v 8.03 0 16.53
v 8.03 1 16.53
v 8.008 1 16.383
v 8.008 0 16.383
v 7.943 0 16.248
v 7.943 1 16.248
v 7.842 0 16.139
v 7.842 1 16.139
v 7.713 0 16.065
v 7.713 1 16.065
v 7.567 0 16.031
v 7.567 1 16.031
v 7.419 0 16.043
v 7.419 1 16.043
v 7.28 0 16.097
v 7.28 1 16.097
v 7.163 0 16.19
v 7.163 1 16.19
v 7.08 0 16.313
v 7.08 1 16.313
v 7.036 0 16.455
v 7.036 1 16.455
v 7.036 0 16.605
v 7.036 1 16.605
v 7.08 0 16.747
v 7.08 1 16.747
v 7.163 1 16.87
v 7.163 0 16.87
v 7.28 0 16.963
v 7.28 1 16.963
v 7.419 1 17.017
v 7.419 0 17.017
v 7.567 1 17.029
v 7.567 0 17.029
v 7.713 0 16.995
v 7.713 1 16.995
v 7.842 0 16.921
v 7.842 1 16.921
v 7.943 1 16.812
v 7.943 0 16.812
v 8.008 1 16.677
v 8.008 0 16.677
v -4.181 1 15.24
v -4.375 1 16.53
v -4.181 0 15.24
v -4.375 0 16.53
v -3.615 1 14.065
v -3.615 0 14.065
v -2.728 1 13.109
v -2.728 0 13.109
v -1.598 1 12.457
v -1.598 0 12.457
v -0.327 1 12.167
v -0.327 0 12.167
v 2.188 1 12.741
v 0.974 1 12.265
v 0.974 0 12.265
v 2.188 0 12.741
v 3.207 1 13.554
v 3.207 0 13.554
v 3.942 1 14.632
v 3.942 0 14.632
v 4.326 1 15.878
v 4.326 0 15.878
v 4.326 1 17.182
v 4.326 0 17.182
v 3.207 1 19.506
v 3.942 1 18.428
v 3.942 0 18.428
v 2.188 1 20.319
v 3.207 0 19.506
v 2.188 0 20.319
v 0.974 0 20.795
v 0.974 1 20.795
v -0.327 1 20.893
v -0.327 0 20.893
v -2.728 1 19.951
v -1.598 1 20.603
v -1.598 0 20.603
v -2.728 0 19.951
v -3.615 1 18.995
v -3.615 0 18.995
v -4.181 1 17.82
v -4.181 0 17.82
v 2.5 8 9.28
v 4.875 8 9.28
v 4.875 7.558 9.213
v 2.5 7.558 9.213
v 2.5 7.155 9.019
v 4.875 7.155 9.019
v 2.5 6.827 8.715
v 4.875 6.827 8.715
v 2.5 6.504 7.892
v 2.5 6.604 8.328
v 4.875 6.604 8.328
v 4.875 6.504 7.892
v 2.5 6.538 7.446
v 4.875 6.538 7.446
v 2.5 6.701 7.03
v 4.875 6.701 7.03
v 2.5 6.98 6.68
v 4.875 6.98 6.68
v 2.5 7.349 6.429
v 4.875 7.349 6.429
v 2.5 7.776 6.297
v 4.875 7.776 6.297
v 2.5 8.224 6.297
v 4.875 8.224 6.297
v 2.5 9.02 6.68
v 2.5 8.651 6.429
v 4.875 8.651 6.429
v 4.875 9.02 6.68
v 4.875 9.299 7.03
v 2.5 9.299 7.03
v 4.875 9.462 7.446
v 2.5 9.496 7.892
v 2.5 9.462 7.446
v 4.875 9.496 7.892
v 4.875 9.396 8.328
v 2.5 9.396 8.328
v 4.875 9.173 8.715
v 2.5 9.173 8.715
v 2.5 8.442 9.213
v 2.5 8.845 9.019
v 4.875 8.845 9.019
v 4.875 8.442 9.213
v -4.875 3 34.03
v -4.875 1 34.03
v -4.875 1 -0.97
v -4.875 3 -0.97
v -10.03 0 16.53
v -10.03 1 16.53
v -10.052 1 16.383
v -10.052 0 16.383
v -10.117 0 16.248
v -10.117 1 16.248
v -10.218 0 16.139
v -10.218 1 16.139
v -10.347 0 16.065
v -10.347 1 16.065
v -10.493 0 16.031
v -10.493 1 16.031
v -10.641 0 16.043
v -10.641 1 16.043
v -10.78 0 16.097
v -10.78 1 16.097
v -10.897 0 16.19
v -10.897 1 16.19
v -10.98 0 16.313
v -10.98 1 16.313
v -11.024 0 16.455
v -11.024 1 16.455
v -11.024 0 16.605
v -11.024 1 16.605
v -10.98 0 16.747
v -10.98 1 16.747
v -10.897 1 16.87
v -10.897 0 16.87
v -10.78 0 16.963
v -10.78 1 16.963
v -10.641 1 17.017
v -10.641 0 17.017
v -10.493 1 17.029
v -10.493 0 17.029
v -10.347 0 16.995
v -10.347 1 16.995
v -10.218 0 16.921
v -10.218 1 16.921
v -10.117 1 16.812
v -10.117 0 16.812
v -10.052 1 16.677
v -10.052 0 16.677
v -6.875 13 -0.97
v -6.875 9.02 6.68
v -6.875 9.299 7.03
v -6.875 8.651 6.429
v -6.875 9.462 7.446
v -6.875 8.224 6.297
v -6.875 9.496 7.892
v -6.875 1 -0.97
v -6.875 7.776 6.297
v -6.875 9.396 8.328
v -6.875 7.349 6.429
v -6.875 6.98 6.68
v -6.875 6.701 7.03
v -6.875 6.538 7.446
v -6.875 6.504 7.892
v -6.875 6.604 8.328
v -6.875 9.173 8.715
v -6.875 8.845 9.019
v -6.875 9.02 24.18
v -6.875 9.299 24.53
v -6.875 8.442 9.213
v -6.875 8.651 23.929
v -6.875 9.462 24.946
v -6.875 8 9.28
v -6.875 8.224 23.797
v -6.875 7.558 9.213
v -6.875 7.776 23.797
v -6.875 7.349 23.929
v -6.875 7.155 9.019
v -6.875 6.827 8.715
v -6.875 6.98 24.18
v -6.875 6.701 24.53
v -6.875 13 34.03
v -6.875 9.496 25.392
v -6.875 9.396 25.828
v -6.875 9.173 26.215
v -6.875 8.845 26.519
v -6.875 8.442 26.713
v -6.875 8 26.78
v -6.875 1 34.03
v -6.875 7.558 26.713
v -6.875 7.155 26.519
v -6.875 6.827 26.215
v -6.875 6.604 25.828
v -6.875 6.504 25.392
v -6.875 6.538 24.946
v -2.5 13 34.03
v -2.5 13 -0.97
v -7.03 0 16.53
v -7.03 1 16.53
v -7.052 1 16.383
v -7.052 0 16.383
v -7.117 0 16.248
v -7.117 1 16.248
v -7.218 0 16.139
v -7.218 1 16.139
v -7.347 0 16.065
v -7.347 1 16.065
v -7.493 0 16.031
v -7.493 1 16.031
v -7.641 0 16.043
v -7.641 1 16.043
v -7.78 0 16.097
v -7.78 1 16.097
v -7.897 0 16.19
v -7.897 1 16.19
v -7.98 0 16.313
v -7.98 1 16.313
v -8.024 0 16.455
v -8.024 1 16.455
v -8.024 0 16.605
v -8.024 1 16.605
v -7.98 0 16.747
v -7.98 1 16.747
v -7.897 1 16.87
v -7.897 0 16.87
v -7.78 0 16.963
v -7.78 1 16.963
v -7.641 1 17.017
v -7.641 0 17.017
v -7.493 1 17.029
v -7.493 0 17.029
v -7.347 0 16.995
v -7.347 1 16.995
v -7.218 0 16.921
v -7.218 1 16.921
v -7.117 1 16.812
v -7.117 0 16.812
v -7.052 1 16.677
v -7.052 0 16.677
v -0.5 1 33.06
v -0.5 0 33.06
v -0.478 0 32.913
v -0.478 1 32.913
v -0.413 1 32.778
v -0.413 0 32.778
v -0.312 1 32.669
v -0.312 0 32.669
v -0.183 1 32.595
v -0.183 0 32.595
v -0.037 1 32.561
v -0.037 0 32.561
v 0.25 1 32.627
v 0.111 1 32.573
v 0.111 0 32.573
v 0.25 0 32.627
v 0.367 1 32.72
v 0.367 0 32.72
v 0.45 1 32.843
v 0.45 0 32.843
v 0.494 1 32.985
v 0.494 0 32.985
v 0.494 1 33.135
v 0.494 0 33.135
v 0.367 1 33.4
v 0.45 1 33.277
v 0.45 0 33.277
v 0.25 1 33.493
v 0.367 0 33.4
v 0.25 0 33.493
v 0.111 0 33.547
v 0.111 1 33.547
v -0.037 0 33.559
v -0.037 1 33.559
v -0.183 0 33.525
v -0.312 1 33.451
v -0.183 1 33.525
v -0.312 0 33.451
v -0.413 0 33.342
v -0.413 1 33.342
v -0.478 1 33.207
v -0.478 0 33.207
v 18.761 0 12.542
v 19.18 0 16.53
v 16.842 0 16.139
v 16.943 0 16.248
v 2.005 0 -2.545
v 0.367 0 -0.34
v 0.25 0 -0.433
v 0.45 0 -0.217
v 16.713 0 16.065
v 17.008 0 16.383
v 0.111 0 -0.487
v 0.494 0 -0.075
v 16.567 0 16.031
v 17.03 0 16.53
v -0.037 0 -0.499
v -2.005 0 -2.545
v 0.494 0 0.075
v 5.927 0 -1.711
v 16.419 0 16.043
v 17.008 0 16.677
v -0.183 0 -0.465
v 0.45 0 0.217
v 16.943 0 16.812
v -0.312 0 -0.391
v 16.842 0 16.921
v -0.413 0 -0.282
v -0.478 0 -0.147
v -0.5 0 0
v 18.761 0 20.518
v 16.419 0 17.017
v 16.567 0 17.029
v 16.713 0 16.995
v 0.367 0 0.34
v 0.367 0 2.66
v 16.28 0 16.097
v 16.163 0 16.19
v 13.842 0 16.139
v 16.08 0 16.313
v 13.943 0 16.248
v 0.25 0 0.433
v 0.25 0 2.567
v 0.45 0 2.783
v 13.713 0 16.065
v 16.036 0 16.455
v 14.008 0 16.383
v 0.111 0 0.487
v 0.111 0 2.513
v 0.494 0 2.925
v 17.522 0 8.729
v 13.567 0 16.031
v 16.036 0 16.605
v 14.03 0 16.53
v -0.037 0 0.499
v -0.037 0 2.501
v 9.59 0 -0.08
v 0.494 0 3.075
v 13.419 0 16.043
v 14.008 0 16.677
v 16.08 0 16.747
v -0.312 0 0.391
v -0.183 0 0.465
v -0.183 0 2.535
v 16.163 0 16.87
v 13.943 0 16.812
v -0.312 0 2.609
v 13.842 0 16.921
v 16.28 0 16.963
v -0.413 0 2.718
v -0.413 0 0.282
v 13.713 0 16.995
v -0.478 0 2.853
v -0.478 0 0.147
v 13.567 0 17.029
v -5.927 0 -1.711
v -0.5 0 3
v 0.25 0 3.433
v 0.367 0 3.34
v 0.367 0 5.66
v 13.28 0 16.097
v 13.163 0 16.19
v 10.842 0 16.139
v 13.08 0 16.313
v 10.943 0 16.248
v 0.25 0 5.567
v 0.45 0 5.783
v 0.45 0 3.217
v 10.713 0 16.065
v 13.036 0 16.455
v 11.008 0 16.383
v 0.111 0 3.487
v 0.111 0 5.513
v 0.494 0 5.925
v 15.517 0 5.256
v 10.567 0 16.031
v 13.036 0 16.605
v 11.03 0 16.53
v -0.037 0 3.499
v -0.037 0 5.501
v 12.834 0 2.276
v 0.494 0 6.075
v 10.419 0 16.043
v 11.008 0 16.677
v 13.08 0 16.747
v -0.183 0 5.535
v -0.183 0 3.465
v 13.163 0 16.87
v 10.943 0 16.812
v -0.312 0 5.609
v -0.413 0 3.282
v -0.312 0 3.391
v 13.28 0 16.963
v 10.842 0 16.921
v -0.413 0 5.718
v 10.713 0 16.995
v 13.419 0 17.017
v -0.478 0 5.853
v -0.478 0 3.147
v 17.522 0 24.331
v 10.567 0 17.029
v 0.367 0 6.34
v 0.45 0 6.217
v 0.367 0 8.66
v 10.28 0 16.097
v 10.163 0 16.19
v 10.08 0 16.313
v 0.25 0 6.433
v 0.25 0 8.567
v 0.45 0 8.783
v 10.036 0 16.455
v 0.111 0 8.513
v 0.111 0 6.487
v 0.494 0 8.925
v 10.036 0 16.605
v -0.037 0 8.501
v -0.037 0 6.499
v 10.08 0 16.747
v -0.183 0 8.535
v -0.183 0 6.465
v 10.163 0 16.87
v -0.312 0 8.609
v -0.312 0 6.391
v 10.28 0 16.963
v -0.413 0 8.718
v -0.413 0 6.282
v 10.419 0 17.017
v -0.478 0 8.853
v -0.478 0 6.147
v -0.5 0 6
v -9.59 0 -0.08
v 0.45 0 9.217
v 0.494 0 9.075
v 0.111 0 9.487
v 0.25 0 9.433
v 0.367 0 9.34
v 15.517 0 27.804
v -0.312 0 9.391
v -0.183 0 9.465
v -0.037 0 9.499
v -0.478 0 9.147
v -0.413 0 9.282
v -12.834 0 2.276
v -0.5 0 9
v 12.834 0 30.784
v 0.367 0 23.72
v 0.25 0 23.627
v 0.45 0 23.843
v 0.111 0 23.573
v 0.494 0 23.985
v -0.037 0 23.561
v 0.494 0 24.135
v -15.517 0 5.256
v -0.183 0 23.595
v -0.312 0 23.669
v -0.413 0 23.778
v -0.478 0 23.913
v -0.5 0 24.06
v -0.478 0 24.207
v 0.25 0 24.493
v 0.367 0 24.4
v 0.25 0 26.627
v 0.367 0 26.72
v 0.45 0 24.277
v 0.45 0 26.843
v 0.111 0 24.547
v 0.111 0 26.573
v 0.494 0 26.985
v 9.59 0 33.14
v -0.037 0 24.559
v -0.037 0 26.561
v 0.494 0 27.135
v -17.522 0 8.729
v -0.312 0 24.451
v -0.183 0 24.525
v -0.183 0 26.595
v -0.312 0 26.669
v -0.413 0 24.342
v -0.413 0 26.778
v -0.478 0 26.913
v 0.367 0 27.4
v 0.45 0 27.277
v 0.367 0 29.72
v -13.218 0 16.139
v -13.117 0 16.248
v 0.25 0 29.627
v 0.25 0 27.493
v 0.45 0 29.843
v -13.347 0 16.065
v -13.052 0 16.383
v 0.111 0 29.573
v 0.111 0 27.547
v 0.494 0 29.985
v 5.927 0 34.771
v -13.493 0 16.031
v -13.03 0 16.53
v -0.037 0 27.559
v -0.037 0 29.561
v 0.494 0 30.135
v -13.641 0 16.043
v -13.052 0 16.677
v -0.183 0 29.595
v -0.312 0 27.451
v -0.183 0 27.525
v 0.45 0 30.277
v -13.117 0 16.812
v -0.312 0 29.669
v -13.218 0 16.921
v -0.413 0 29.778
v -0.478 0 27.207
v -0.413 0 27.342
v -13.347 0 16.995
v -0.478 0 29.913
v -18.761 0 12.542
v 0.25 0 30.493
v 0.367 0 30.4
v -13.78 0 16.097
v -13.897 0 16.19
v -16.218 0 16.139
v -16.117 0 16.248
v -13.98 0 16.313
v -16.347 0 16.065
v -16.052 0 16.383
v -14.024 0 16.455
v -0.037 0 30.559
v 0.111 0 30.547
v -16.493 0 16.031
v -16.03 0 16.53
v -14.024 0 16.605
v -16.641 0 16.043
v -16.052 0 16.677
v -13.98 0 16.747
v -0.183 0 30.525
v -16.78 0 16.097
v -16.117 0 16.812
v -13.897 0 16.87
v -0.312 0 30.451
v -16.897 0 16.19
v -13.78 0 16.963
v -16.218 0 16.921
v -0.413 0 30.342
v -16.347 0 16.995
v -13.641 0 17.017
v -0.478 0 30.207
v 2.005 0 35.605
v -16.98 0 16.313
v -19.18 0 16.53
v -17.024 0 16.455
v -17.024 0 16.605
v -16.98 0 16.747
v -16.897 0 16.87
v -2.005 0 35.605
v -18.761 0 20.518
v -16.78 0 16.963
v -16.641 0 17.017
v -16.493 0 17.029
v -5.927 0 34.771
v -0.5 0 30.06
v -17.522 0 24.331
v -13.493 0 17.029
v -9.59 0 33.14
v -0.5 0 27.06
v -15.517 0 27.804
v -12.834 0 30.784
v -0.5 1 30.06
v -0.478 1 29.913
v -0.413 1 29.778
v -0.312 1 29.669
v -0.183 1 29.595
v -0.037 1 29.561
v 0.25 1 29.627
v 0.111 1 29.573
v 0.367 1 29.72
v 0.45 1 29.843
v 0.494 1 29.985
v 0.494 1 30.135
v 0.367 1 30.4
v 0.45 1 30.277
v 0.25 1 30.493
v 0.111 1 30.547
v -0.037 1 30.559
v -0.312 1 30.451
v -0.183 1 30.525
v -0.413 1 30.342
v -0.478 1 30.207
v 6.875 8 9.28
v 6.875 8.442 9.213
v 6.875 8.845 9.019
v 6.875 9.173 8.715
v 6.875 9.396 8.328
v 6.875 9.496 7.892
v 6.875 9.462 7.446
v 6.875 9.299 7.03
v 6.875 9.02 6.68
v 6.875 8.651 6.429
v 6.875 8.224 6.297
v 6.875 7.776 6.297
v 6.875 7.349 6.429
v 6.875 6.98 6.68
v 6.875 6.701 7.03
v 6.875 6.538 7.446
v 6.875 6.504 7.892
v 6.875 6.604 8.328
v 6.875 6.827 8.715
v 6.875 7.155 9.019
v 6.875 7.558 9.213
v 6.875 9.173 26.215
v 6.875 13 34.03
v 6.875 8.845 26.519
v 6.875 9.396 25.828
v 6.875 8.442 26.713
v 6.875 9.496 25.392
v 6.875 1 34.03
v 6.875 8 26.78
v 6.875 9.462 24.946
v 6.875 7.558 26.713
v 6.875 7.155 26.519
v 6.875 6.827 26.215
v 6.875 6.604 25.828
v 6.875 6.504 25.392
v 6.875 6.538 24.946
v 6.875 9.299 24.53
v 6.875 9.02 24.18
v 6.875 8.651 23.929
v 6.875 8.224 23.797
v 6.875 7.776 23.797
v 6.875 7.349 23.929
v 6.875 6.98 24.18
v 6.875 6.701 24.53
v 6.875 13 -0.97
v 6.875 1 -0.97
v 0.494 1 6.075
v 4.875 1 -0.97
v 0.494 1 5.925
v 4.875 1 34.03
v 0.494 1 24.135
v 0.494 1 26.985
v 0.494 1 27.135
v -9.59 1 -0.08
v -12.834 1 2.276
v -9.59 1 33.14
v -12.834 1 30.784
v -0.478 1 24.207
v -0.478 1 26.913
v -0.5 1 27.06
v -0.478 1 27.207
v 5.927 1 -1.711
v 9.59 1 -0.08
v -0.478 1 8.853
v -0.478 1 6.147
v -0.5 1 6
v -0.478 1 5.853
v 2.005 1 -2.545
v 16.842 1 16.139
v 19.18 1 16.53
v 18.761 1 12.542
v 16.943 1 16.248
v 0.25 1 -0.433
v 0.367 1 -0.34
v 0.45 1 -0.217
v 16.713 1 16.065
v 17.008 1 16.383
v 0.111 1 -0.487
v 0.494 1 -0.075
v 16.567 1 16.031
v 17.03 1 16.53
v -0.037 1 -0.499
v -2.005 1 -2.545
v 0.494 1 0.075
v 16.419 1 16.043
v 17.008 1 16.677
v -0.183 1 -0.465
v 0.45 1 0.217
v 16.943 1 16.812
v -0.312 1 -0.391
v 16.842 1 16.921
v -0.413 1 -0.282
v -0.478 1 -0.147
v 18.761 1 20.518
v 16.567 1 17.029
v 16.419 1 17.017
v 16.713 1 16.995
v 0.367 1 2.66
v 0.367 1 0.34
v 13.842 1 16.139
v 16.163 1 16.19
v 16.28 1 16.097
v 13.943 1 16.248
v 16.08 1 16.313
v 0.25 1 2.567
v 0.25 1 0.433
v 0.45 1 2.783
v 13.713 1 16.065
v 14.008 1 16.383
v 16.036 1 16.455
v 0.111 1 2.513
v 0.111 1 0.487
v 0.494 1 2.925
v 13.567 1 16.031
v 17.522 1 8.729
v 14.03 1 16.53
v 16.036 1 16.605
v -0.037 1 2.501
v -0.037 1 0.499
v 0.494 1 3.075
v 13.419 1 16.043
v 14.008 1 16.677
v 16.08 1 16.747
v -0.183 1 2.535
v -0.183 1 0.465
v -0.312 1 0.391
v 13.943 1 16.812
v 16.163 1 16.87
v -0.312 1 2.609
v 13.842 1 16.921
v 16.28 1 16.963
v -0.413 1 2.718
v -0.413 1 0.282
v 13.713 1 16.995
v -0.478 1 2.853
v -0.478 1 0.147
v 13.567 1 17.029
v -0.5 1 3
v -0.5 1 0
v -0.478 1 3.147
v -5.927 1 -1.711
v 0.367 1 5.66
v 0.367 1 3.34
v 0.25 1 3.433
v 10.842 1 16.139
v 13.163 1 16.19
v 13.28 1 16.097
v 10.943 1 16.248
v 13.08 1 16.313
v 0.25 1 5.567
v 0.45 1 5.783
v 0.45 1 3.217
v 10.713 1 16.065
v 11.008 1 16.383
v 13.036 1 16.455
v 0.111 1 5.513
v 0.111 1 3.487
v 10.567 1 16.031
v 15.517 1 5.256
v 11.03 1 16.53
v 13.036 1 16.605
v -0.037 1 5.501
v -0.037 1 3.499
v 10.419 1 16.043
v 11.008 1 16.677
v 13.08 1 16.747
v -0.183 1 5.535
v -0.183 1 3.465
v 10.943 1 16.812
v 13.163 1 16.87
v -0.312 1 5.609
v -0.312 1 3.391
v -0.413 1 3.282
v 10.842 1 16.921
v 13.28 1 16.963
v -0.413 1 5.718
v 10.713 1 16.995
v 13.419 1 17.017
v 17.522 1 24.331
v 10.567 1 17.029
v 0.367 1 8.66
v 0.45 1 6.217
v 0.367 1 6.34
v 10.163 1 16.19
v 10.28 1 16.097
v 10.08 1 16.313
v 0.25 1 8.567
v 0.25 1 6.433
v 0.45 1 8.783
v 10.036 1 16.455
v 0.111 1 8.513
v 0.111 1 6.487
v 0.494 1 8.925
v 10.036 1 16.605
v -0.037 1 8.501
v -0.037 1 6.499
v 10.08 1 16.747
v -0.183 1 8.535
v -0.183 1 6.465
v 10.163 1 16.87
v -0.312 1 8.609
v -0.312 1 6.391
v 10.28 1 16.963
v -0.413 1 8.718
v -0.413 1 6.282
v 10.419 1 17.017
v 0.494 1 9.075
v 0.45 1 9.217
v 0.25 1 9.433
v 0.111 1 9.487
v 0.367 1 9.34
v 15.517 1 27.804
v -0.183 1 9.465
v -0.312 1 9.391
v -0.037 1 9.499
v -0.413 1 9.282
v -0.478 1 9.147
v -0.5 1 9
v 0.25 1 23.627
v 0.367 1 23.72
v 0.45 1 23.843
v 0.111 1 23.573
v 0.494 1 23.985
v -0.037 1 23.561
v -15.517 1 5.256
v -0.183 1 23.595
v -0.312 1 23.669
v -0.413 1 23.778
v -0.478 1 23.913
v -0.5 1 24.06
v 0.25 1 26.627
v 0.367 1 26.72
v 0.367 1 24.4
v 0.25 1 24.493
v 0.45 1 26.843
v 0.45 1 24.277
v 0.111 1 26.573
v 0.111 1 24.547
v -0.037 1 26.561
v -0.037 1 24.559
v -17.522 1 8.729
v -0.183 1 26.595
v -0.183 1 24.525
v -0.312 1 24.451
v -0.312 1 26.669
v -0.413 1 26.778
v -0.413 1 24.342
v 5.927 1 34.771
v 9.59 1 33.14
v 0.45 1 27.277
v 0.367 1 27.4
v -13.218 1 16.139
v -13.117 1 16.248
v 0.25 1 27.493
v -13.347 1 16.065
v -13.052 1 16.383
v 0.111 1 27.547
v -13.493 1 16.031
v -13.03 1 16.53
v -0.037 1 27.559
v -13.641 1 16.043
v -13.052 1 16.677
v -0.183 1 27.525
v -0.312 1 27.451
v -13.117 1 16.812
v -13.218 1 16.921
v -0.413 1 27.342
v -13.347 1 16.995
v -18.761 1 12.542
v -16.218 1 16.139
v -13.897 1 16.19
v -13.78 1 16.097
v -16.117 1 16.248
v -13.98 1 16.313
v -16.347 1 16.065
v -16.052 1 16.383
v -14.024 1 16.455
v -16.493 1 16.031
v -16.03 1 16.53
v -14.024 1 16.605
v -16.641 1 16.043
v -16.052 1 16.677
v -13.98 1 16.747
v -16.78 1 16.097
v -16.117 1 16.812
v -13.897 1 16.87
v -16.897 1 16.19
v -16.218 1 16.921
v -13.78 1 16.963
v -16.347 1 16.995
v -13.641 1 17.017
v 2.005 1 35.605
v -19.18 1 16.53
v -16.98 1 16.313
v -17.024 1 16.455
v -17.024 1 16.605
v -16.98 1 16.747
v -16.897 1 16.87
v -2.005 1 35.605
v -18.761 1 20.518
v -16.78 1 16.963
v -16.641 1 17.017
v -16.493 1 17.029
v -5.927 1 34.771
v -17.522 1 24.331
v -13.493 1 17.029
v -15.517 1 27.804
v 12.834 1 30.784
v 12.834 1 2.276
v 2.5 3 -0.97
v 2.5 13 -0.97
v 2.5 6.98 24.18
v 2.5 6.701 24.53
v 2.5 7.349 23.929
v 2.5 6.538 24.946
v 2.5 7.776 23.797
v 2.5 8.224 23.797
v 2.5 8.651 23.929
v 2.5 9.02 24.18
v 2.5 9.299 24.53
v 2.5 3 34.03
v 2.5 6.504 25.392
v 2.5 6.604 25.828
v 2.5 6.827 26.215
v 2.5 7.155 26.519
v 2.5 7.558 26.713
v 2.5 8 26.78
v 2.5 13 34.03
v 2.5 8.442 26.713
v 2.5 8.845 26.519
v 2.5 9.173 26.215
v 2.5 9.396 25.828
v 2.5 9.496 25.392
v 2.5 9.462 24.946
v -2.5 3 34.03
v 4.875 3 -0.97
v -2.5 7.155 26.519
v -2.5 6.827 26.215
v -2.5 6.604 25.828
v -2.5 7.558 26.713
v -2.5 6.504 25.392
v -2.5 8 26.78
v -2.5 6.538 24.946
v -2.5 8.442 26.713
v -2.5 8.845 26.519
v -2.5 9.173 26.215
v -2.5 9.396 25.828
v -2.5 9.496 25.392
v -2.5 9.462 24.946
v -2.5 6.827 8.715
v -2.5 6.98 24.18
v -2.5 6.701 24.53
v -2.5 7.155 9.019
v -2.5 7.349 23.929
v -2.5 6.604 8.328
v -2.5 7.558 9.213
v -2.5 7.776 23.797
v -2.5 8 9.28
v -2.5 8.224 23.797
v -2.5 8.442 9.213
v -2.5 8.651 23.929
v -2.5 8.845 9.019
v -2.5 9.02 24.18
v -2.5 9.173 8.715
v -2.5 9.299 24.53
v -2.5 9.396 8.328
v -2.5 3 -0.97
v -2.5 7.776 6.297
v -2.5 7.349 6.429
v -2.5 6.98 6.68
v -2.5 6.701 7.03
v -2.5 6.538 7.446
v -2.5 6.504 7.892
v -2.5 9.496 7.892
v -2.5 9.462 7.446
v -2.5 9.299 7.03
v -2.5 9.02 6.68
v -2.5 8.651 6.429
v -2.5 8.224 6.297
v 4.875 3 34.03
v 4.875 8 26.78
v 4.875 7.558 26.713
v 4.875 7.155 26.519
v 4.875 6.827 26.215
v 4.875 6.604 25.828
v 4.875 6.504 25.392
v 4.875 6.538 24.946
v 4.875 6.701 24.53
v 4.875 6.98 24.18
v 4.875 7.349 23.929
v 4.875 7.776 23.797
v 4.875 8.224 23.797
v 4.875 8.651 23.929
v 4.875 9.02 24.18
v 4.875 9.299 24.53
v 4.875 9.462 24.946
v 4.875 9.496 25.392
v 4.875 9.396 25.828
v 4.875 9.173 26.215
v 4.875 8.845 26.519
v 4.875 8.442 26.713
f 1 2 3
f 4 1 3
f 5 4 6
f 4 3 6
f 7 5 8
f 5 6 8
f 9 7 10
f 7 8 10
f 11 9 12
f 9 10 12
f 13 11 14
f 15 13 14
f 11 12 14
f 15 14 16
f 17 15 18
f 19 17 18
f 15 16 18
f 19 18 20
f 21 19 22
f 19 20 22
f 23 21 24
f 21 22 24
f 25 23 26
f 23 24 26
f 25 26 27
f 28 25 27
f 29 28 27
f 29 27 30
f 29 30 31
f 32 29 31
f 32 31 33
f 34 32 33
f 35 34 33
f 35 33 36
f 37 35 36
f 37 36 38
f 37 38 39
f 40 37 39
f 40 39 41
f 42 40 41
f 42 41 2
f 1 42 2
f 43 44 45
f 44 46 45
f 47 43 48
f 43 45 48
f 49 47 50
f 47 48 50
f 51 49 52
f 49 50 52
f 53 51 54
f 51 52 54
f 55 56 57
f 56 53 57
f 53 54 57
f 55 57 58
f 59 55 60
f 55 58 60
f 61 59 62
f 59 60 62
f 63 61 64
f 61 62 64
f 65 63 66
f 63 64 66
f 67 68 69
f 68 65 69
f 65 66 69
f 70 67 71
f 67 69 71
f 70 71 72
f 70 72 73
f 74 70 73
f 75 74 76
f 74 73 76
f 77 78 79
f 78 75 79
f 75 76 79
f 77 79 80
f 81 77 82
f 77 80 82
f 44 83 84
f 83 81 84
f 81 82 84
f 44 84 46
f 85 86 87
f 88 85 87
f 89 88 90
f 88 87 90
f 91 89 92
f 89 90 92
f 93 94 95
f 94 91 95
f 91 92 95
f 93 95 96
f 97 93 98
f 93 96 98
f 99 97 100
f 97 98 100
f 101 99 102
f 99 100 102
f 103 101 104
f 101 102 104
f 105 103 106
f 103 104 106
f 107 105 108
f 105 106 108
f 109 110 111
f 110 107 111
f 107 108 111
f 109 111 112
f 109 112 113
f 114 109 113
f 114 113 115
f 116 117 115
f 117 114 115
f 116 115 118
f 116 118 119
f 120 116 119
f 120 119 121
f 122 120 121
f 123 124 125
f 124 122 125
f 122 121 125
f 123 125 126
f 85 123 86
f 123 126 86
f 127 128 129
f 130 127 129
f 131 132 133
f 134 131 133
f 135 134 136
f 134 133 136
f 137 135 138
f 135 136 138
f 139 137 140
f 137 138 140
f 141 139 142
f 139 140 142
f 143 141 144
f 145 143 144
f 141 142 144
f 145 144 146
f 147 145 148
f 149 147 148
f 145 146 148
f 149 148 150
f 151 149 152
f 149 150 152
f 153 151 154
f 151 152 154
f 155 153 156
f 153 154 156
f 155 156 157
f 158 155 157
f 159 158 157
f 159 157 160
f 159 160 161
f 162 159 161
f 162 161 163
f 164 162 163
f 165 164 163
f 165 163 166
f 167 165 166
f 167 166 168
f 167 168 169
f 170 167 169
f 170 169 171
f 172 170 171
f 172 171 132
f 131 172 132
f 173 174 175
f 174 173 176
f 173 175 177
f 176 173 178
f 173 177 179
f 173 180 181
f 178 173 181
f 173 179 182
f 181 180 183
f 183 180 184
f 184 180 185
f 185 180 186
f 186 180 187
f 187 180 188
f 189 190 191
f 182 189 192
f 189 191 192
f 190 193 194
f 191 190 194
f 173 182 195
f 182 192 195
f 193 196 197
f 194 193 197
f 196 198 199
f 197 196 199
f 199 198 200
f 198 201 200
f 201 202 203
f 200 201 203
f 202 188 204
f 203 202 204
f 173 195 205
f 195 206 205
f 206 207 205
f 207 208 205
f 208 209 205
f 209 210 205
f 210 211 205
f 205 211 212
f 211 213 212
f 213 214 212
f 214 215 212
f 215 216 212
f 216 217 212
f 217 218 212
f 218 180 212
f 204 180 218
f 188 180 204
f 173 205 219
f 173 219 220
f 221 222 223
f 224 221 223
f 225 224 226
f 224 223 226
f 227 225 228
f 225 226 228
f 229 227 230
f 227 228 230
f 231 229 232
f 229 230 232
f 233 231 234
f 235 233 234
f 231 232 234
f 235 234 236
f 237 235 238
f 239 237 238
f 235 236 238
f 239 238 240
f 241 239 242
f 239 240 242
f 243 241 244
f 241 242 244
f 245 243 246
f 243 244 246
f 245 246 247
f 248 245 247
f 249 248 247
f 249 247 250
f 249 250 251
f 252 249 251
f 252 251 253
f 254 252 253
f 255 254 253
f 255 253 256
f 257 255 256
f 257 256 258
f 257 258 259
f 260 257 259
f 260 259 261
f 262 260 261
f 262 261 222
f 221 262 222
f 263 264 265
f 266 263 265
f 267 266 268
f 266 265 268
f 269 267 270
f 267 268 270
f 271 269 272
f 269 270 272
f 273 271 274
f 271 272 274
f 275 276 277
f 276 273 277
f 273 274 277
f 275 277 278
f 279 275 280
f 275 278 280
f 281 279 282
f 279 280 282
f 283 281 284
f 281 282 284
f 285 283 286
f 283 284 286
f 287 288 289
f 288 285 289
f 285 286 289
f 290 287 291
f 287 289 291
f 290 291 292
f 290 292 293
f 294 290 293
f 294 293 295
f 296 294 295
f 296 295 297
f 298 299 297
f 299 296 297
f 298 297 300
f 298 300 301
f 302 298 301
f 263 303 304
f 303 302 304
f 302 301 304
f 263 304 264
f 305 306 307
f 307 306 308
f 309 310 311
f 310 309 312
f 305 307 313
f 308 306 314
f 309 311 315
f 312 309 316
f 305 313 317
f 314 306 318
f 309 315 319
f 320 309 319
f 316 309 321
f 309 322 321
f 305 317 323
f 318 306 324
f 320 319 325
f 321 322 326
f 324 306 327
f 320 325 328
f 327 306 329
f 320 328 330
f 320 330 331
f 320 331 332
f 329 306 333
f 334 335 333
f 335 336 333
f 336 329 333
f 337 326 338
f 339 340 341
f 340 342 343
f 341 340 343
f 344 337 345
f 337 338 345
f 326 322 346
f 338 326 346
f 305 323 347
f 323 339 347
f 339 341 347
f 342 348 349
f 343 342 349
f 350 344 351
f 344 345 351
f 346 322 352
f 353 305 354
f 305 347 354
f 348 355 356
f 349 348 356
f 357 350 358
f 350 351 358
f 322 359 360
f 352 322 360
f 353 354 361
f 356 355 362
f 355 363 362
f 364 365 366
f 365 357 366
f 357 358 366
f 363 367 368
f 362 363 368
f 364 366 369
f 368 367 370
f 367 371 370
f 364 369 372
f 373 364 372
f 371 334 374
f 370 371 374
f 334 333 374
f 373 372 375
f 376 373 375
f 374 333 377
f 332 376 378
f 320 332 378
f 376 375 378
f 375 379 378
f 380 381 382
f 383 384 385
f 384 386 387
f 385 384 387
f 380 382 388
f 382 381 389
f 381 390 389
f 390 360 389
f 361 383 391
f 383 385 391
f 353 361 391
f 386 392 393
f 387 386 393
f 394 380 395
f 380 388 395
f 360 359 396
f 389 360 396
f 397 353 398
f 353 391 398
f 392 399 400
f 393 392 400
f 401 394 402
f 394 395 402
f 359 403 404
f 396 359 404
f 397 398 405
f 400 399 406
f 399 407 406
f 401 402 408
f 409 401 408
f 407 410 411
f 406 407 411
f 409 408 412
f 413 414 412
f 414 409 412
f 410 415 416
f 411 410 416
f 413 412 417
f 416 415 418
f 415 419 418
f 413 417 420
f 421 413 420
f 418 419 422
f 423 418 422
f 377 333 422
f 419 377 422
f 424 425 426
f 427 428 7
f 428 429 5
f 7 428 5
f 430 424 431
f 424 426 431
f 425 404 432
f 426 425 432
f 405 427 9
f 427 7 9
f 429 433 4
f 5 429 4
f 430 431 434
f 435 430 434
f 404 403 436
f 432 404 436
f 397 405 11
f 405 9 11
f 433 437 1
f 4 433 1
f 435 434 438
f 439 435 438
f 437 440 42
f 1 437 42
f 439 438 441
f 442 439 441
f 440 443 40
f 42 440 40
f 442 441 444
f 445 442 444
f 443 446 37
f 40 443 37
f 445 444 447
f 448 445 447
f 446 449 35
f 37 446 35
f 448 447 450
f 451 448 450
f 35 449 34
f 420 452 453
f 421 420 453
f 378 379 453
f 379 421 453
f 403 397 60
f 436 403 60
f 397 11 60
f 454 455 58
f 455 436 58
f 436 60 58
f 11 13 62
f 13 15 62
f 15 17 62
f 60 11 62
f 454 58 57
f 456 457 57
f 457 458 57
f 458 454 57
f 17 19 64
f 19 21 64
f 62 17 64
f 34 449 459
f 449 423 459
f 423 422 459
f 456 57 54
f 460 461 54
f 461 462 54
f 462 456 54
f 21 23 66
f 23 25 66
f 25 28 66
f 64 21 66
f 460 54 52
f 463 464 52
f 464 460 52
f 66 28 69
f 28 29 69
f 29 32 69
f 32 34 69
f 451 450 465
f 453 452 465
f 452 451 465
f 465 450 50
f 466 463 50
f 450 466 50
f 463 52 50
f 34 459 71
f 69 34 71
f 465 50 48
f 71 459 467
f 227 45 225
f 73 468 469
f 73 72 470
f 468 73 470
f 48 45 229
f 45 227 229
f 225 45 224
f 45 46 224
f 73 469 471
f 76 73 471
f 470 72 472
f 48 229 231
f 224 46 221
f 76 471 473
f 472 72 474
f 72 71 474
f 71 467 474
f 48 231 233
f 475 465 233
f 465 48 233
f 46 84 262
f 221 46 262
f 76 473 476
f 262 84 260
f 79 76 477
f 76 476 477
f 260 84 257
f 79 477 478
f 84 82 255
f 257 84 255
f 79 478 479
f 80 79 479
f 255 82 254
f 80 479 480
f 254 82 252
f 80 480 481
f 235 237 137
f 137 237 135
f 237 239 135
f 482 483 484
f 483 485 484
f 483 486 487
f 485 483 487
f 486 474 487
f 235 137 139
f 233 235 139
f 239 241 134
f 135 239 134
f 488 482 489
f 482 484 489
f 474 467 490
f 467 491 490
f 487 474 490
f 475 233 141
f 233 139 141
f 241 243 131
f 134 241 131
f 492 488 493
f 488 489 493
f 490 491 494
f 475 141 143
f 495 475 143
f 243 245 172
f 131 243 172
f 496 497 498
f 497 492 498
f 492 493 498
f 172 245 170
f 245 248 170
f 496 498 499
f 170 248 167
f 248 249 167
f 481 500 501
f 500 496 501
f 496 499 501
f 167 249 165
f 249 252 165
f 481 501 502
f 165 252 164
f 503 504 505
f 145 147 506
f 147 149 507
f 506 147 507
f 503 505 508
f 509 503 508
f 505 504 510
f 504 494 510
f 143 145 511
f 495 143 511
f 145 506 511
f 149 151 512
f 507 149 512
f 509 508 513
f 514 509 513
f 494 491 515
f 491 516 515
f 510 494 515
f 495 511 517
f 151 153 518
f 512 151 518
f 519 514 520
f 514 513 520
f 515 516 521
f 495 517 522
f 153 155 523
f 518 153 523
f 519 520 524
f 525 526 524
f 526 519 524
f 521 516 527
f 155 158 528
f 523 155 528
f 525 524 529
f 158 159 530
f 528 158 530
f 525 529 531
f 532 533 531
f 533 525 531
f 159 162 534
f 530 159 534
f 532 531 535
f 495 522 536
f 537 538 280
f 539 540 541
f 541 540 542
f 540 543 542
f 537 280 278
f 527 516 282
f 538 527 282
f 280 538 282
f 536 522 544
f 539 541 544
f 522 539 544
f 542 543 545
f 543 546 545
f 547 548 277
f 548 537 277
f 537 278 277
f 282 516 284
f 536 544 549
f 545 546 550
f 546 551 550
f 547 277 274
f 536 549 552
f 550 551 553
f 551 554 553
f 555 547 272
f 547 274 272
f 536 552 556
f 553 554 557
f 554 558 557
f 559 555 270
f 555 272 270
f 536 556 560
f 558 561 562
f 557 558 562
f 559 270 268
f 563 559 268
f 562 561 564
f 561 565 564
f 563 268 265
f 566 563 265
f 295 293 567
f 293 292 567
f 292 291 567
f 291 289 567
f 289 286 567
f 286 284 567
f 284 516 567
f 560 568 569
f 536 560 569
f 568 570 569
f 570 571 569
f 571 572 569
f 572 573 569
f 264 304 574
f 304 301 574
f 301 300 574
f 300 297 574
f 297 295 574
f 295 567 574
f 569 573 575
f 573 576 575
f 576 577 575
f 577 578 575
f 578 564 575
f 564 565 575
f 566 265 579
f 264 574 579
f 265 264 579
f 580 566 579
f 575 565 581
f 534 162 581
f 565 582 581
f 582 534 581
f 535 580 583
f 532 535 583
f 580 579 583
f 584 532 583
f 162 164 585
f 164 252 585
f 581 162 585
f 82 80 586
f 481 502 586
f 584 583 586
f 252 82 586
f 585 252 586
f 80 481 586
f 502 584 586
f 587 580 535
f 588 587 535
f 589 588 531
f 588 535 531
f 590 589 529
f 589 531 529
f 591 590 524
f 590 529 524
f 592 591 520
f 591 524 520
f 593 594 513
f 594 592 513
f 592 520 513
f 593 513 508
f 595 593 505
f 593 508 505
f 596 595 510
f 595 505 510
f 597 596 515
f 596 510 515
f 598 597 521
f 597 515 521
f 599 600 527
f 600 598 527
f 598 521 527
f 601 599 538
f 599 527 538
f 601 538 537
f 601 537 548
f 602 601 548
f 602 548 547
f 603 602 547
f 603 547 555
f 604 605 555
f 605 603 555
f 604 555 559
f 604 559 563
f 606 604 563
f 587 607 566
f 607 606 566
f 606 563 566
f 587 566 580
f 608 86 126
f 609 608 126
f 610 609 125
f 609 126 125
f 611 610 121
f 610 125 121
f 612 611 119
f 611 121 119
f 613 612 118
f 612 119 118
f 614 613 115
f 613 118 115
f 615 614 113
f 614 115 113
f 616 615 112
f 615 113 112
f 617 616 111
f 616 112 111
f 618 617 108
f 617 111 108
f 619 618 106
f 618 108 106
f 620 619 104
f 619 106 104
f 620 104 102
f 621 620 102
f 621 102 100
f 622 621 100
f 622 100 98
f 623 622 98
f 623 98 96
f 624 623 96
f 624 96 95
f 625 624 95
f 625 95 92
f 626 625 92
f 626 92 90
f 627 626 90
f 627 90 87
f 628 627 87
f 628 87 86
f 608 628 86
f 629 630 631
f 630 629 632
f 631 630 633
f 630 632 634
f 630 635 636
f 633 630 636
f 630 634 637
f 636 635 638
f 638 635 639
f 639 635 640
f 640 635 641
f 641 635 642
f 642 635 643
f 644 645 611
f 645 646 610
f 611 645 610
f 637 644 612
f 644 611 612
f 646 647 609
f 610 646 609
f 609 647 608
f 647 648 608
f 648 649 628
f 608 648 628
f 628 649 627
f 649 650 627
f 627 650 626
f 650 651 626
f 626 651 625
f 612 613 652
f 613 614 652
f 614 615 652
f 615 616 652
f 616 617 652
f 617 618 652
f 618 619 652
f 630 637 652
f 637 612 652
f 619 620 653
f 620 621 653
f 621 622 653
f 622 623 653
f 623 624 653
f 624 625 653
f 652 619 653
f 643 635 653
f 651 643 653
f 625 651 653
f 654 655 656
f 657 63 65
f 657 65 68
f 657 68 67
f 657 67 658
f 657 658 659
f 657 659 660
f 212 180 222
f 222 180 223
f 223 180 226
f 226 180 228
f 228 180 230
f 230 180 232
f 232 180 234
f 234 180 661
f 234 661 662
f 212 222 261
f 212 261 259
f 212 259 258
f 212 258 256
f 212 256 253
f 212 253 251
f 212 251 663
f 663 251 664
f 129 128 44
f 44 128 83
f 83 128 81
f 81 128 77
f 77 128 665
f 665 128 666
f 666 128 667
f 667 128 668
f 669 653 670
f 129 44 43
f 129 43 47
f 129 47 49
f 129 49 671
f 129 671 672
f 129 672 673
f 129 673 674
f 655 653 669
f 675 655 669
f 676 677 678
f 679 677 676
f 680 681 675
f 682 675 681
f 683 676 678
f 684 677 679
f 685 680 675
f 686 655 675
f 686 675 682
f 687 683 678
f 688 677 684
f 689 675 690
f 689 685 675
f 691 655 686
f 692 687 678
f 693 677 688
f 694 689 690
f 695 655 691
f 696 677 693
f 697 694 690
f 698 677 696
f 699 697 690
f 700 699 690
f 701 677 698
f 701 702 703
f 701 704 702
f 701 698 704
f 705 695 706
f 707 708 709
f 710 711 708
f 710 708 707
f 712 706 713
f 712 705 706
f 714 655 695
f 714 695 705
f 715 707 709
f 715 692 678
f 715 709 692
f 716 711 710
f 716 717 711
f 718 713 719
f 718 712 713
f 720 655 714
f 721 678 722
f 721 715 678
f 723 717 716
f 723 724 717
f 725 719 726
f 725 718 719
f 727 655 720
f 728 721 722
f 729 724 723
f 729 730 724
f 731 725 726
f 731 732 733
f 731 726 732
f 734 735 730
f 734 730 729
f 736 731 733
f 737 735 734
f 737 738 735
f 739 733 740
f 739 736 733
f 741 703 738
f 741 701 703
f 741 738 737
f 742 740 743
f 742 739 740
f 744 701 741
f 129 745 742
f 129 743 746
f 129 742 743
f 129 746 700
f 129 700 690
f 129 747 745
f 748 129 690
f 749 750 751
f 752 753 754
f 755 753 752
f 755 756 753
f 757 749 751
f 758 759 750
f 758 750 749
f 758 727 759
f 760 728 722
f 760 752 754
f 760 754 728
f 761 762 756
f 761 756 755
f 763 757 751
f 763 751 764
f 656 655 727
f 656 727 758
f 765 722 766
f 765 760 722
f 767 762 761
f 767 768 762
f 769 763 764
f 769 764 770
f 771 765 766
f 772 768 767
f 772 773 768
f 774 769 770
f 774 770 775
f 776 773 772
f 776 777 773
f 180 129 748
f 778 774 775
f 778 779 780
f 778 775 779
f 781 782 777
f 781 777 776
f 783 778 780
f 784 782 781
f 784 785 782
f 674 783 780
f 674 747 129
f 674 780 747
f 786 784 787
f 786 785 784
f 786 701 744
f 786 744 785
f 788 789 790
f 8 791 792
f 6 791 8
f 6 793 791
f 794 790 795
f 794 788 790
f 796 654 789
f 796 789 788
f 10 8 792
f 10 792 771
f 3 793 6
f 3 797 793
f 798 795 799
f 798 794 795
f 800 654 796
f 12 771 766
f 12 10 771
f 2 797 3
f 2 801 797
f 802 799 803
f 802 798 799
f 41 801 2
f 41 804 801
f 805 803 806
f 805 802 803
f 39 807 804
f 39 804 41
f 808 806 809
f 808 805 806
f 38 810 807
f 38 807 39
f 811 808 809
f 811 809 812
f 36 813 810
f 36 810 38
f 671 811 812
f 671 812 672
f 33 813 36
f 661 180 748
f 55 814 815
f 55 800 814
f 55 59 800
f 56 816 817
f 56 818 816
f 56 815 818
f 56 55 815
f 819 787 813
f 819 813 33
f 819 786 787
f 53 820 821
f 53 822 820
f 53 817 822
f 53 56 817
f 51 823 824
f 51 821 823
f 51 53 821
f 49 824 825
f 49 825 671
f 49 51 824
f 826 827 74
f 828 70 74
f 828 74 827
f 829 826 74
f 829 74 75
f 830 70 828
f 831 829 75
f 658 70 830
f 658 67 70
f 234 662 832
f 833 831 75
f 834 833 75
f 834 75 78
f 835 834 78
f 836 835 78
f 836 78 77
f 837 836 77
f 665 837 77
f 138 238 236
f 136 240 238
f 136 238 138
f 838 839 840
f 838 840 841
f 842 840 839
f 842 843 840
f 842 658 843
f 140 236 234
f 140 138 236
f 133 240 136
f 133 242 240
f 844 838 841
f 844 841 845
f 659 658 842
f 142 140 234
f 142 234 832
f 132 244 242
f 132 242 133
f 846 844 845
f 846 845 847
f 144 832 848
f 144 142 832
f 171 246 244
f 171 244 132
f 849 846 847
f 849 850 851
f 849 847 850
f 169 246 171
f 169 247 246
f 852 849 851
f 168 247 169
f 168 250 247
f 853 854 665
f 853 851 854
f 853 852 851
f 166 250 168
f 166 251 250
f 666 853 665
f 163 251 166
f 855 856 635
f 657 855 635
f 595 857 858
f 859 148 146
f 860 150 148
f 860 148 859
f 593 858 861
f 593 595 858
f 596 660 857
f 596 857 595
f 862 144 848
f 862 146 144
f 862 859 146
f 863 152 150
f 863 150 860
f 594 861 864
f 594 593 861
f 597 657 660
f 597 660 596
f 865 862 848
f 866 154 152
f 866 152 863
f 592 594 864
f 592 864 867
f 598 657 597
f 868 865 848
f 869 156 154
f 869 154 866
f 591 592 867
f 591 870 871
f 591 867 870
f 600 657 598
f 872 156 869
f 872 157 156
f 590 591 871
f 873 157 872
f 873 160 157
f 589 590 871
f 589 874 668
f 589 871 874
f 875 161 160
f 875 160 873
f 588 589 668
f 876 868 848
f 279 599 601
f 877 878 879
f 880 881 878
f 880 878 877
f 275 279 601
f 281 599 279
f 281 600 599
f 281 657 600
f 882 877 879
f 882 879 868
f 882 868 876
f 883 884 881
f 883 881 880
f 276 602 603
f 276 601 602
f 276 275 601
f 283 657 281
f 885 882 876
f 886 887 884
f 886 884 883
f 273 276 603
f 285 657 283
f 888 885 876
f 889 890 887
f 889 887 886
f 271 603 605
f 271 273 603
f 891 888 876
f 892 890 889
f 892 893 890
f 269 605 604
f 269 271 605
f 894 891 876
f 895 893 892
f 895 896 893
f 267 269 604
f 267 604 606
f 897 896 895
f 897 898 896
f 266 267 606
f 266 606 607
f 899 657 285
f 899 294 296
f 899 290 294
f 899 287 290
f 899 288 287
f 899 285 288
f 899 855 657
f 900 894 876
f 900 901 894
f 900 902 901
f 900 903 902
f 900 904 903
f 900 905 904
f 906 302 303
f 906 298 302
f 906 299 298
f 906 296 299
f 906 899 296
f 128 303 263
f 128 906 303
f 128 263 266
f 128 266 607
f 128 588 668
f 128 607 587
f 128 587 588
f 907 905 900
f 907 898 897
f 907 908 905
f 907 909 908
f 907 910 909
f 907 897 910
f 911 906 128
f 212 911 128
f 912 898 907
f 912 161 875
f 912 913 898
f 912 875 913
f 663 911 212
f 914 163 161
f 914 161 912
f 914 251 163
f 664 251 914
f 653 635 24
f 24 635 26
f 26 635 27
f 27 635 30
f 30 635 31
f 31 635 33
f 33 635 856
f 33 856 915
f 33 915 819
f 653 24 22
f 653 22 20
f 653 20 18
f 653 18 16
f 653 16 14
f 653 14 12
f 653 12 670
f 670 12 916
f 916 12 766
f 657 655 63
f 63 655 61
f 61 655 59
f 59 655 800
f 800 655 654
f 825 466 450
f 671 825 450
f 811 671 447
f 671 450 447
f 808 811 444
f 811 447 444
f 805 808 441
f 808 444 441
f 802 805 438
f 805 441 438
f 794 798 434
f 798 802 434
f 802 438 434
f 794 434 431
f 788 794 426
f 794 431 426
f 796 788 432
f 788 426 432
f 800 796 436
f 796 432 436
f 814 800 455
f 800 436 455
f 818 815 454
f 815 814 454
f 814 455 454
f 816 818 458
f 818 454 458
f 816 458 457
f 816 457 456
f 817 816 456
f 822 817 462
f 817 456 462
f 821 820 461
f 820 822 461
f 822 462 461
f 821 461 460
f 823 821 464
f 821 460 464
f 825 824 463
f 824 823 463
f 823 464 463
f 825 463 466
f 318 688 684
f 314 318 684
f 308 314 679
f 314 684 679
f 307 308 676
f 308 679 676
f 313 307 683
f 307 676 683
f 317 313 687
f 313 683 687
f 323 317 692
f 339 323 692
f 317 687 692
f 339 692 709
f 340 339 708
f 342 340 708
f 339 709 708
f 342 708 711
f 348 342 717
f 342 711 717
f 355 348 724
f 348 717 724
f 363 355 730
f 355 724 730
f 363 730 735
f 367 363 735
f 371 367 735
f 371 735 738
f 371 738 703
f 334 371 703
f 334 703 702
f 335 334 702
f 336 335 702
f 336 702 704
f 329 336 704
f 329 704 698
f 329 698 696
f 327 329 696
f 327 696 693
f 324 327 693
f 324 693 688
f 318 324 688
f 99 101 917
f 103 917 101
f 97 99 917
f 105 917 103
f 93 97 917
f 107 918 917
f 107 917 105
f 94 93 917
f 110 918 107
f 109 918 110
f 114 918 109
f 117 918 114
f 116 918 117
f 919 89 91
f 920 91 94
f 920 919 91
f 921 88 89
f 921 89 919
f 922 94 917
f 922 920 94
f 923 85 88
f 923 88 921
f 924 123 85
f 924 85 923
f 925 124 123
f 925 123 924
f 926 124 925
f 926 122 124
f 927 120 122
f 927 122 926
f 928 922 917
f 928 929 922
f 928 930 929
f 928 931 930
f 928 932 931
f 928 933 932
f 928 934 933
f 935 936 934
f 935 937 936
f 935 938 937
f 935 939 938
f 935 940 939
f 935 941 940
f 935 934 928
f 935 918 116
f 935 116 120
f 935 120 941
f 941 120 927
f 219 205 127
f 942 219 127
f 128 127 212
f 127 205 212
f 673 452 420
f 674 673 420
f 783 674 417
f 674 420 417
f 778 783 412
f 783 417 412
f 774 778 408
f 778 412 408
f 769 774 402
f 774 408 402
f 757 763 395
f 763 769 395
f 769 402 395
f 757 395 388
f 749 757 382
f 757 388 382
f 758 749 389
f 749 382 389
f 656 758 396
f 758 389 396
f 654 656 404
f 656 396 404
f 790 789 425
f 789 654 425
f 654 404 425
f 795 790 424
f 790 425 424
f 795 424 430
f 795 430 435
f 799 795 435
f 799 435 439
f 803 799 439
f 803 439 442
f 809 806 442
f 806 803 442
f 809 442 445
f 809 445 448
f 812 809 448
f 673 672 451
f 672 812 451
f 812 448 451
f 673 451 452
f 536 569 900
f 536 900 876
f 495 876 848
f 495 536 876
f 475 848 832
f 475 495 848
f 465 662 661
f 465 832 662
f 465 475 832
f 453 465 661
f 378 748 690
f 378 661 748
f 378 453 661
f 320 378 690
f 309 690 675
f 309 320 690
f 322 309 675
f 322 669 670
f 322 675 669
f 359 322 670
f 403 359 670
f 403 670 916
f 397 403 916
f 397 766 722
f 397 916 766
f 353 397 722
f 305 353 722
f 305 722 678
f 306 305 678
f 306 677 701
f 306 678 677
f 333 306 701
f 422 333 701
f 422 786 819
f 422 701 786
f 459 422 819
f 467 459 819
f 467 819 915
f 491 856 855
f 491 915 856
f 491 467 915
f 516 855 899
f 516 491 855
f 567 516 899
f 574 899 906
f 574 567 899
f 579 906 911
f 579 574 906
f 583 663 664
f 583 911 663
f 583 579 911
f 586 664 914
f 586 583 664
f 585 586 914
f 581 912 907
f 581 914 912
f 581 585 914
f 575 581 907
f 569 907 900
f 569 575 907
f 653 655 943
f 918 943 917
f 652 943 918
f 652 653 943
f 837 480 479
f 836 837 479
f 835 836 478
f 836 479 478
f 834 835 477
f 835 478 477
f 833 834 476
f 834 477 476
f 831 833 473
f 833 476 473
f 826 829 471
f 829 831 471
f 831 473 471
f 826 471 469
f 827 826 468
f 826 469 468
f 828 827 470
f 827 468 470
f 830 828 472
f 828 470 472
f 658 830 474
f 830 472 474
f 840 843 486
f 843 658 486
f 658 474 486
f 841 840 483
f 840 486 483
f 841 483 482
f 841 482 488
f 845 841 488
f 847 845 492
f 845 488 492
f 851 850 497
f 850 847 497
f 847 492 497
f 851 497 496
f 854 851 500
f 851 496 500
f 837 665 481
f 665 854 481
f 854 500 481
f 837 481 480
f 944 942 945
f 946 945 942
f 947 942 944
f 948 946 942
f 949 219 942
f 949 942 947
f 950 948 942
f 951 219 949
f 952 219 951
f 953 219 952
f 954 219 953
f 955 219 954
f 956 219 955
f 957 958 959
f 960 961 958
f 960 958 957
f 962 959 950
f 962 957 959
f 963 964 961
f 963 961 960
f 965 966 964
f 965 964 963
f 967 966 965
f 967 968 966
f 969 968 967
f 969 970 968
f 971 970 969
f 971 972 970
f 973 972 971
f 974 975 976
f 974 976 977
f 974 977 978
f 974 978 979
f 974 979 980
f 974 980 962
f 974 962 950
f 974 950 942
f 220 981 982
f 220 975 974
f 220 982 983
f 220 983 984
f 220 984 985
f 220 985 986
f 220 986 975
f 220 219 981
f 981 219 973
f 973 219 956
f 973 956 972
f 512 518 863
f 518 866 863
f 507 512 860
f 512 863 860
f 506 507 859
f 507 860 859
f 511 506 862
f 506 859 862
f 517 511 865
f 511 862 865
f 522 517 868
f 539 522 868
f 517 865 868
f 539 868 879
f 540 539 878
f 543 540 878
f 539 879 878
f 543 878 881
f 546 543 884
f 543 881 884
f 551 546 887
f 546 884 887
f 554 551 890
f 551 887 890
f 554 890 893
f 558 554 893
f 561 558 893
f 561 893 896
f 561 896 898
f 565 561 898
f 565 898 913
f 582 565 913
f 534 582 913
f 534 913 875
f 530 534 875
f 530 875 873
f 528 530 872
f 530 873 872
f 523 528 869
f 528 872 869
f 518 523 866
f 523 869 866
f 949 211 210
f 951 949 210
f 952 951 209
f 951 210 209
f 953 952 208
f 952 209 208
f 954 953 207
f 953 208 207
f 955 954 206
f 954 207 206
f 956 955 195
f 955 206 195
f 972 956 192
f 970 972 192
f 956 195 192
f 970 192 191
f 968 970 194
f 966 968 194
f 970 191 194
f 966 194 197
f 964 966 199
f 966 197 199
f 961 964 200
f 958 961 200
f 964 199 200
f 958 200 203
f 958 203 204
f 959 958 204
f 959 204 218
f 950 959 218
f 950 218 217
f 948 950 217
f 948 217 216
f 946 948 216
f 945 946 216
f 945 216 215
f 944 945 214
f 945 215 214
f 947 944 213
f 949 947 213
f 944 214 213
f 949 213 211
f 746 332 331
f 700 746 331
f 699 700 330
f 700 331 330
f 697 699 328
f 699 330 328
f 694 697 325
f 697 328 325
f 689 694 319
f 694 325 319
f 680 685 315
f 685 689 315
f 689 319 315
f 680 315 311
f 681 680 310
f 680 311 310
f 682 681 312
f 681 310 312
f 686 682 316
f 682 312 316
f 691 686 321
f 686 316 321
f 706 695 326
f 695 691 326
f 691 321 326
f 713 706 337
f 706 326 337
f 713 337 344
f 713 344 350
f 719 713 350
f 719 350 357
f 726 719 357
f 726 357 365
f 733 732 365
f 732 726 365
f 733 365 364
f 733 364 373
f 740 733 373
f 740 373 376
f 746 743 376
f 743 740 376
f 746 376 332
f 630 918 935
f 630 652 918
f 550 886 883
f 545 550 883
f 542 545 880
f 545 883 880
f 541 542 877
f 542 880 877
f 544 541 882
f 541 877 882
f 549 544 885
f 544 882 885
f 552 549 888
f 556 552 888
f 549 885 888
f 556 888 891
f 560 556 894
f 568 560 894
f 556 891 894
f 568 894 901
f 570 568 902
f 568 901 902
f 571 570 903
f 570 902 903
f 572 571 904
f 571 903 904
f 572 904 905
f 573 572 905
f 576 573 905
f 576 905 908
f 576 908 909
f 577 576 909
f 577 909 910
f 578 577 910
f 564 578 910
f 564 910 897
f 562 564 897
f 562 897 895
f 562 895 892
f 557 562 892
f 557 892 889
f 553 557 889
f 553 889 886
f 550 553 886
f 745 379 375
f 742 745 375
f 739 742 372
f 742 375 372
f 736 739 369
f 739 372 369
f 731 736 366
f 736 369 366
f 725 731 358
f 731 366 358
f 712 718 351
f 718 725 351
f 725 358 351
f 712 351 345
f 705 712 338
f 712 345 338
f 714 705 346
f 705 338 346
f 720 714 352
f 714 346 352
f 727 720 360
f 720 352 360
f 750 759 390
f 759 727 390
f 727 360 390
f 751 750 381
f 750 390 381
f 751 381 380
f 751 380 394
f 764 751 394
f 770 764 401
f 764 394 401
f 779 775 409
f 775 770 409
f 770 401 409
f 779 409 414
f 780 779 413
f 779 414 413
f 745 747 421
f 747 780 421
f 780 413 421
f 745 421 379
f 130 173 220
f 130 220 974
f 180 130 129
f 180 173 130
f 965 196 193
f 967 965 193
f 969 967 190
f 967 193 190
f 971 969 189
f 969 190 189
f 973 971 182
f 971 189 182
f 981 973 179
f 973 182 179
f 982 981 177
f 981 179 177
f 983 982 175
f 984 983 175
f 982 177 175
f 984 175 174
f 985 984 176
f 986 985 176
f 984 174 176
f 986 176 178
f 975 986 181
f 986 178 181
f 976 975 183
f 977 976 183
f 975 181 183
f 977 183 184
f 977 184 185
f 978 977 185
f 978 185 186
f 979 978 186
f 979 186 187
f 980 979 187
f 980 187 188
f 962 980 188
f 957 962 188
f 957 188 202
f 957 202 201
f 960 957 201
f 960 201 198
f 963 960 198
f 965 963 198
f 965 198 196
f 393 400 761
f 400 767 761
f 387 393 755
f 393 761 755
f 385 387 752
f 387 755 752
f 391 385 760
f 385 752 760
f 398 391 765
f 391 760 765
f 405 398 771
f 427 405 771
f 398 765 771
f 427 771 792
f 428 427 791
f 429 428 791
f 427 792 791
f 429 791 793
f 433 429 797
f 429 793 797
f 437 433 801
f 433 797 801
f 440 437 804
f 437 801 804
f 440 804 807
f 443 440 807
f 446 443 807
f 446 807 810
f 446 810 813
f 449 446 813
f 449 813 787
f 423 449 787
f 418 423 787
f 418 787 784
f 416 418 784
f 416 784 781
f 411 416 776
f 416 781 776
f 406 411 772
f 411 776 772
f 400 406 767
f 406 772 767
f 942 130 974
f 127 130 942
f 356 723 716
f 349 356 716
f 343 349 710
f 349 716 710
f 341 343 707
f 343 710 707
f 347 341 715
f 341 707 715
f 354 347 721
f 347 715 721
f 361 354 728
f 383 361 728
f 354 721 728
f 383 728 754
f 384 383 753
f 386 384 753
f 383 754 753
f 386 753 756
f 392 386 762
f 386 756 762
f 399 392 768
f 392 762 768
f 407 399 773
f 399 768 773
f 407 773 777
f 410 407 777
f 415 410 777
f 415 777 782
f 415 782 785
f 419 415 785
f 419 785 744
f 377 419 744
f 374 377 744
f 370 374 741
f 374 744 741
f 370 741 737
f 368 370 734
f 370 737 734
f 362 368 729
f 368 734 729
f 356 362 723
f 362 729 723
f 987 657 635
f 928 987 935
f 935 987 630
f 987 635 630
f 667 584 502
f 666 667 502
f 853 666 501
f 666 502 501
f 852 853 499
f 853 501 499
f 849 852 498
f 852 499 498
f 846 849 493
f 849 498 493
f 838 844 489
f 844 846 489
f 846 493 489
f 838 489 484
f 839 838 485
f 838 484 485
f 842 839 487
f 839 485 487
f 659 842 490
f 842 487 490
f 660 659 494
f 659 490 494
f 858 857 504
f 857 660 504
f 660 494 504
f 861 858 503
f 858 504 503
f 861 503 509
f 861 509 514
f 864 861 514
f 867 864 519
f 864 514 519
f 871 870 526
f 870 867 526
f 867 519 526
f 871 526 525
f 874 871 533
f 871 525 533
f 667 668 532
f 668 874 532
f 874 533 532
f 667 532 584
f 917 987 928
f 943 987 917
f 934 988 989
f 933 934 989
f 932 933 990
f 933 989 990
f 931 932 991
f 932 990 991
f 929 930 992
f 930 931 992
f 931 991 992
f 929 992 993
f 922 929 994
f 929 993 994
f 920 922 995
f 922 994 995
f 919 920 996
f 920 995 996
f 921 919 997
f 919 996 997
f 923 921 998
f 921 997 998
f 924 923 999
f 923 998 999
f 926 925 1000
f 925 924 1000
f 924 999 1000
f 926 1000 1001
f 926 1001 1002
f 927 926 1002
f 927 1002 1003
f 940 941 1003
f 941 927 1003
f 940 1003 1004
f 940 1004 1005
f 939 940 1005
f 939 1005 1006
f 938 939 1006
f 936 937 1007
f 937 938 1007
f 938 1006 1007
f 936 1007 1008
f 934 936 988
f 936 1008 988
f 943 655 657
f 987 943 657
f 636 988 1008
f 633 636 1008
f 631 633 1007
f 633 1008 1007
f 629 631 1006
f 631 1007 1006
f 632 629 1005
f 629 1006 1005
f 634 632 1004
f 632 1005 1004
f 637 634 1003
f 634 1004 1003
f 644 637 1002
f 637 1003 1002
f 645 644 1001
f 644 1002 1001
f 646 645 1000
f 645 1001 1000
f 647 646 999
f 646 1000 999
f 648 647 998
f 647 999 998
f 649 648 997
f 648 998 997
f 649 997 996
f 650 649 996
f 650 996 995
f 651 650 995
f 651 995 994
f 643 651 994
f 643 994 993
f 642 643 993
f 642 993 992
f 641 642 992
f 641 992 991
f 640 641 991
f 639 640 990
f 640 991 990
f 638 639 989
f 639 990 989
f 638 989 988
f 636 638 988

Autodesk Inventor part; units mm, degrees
ref_plane "XZ Plane" through (0, 0, 0) normal (0, 1, 0) x (-1, 0, 0)
sketch "Sketch1" plane through (0, 0, 0) normal (0, 1, 0) x (-1, 0, 0)
  circle A0 centre (0, 27.06) radius 0.5
  circle A1 centre (0, 24.06) radius 0.5
  circle A2 centre (0, 16.53) radius 4.375
  circle A3 centre (0, 3) radius 0.5
  circle A4 centre (0, 6) radius 0.5
  circle A5 centre (0, 9) radius 0.5
  circle A6 centre (0, 0) radius 0.5
  circle A7 centre (0, 30.06) radius 0.5
  circle A8 centre (0, 33.06) radius 0.5
  circle A9 centre (0, 16.53) radius 19.18
extrude "Extrusion1" add sketch "Sketch1" along normal blind 1
sketch "Sketch5" plane through (0, 1, 16.53) normal (0, 1, 0) x (1, 0, 0)
  line L0 (4.875, 0) -> (4.875, -17.5)
  line L1 (4.875, -17.5) -> (6.875, -17.5)
  line L2 (6.875, -17.5) -> (6.875, 0)
  line L3 (4.875, 0) -> (4.875, 17.5)
  line L4 (4.875, 17.5) -> (6.875, 17.5)
  line L5 (6.875, 17.5) -> (6.875, 0)
  point P0 (0, 16.53)
extrude "Extrusion4" add sketch "Sketch5" along normal blind 12
sketch "Sketch6" plane through (4.875, 1, -0.97) normal (-1, 0, 0) x (0, 0, 1)
  line L0 (36.68, 0) -> (-1.68, 0) projected
  line L1 (35, 2) -> (17.5, 2)
  line L2 (17.5, 2) -> (0, 2)
  line L3 (0, 12) -> (35, 12)
  line L4 (35, 2) -> (35, 12)
  line L5 (0, 2) -> (0, 12)
  circle A0 centre (8.75, 7) radius 1.5
  circle A1 centre (26.25, 7) radius 1.5
  point P0 (0.97, -1)
  dimension "d18" = 3
extrude "Extrusion5" cut sketch "Sketch6" against normal blind 12 contours A0 | A1
extrude "Extrusion6" add sketch "Sketch6" along normal blind 2.375
ref_plane "Work Plane1" through (0, 0, 0) normal (1, 0, 0) x (0, 1, 0)
mirror "Mirror1" about plane through (0, 0, 0) normal (1, 0, 0) of "Extrusion6", "Extrusion4", "Extrusion5"
ref_plane "Work Plane2" through (0, 1, 16.53) normal (0, 1, 0) x (1, 0, 0)
sketch "Sketch7" plane through (0, 1, 16.53) normal (0, 1, 0) x (1, 0, 0)
  circle A0 centre (0, 0) radius 4.375 projected
  circle A1 centre (0, 16.53) radius 0.5 projected
  circle A2 centre (0, 13.53) radius 0.5 projected
  circle A3 centre (0, 10.53) radius 0.5 projected
  circle A4 centre (0, 7.53) radius 0.5 projected
  circle A5 centre (0, -10.53) radius 0.5 projected
  circle A6 centre (0, -16.53) radius 0.5 projected
  circle A7 centre (0, -13.53) radius 0.5 projected
  circle A8 centre (0, -7.53) radius 0.5 projected
  circle A9 centre (0, 0) radius 19.18 projected
  circle A10 centre (0, 0) radius 4.375 projected
  circle A11 centre (7.53, 0) radius 0.5
  circle A12 centre (10.53, 0) radius 0.5
  circle A13 centre (13.53, 0) radius 0.5
  circle A14 centre (16.53, 0) radius 0.5
  circle A15 centre (0, -13.53) radius 0.5
  circle A16 centre (-7.53, 0) radius 0.5
  circle A17 centre (-10.53, 0) radius 0.5
  circle A18 centre (-13.53, 0) radius 0.5
  circle A19 centre (-16.53, 0) radius 0.5
extrude "Extrusion7" cut sketch "Sketch7" along normal mid plane 10 contours A11 | A12 | A13 | A14 | A16 | A17 | A18 | A19
properties part number "horn_fin_normal"
